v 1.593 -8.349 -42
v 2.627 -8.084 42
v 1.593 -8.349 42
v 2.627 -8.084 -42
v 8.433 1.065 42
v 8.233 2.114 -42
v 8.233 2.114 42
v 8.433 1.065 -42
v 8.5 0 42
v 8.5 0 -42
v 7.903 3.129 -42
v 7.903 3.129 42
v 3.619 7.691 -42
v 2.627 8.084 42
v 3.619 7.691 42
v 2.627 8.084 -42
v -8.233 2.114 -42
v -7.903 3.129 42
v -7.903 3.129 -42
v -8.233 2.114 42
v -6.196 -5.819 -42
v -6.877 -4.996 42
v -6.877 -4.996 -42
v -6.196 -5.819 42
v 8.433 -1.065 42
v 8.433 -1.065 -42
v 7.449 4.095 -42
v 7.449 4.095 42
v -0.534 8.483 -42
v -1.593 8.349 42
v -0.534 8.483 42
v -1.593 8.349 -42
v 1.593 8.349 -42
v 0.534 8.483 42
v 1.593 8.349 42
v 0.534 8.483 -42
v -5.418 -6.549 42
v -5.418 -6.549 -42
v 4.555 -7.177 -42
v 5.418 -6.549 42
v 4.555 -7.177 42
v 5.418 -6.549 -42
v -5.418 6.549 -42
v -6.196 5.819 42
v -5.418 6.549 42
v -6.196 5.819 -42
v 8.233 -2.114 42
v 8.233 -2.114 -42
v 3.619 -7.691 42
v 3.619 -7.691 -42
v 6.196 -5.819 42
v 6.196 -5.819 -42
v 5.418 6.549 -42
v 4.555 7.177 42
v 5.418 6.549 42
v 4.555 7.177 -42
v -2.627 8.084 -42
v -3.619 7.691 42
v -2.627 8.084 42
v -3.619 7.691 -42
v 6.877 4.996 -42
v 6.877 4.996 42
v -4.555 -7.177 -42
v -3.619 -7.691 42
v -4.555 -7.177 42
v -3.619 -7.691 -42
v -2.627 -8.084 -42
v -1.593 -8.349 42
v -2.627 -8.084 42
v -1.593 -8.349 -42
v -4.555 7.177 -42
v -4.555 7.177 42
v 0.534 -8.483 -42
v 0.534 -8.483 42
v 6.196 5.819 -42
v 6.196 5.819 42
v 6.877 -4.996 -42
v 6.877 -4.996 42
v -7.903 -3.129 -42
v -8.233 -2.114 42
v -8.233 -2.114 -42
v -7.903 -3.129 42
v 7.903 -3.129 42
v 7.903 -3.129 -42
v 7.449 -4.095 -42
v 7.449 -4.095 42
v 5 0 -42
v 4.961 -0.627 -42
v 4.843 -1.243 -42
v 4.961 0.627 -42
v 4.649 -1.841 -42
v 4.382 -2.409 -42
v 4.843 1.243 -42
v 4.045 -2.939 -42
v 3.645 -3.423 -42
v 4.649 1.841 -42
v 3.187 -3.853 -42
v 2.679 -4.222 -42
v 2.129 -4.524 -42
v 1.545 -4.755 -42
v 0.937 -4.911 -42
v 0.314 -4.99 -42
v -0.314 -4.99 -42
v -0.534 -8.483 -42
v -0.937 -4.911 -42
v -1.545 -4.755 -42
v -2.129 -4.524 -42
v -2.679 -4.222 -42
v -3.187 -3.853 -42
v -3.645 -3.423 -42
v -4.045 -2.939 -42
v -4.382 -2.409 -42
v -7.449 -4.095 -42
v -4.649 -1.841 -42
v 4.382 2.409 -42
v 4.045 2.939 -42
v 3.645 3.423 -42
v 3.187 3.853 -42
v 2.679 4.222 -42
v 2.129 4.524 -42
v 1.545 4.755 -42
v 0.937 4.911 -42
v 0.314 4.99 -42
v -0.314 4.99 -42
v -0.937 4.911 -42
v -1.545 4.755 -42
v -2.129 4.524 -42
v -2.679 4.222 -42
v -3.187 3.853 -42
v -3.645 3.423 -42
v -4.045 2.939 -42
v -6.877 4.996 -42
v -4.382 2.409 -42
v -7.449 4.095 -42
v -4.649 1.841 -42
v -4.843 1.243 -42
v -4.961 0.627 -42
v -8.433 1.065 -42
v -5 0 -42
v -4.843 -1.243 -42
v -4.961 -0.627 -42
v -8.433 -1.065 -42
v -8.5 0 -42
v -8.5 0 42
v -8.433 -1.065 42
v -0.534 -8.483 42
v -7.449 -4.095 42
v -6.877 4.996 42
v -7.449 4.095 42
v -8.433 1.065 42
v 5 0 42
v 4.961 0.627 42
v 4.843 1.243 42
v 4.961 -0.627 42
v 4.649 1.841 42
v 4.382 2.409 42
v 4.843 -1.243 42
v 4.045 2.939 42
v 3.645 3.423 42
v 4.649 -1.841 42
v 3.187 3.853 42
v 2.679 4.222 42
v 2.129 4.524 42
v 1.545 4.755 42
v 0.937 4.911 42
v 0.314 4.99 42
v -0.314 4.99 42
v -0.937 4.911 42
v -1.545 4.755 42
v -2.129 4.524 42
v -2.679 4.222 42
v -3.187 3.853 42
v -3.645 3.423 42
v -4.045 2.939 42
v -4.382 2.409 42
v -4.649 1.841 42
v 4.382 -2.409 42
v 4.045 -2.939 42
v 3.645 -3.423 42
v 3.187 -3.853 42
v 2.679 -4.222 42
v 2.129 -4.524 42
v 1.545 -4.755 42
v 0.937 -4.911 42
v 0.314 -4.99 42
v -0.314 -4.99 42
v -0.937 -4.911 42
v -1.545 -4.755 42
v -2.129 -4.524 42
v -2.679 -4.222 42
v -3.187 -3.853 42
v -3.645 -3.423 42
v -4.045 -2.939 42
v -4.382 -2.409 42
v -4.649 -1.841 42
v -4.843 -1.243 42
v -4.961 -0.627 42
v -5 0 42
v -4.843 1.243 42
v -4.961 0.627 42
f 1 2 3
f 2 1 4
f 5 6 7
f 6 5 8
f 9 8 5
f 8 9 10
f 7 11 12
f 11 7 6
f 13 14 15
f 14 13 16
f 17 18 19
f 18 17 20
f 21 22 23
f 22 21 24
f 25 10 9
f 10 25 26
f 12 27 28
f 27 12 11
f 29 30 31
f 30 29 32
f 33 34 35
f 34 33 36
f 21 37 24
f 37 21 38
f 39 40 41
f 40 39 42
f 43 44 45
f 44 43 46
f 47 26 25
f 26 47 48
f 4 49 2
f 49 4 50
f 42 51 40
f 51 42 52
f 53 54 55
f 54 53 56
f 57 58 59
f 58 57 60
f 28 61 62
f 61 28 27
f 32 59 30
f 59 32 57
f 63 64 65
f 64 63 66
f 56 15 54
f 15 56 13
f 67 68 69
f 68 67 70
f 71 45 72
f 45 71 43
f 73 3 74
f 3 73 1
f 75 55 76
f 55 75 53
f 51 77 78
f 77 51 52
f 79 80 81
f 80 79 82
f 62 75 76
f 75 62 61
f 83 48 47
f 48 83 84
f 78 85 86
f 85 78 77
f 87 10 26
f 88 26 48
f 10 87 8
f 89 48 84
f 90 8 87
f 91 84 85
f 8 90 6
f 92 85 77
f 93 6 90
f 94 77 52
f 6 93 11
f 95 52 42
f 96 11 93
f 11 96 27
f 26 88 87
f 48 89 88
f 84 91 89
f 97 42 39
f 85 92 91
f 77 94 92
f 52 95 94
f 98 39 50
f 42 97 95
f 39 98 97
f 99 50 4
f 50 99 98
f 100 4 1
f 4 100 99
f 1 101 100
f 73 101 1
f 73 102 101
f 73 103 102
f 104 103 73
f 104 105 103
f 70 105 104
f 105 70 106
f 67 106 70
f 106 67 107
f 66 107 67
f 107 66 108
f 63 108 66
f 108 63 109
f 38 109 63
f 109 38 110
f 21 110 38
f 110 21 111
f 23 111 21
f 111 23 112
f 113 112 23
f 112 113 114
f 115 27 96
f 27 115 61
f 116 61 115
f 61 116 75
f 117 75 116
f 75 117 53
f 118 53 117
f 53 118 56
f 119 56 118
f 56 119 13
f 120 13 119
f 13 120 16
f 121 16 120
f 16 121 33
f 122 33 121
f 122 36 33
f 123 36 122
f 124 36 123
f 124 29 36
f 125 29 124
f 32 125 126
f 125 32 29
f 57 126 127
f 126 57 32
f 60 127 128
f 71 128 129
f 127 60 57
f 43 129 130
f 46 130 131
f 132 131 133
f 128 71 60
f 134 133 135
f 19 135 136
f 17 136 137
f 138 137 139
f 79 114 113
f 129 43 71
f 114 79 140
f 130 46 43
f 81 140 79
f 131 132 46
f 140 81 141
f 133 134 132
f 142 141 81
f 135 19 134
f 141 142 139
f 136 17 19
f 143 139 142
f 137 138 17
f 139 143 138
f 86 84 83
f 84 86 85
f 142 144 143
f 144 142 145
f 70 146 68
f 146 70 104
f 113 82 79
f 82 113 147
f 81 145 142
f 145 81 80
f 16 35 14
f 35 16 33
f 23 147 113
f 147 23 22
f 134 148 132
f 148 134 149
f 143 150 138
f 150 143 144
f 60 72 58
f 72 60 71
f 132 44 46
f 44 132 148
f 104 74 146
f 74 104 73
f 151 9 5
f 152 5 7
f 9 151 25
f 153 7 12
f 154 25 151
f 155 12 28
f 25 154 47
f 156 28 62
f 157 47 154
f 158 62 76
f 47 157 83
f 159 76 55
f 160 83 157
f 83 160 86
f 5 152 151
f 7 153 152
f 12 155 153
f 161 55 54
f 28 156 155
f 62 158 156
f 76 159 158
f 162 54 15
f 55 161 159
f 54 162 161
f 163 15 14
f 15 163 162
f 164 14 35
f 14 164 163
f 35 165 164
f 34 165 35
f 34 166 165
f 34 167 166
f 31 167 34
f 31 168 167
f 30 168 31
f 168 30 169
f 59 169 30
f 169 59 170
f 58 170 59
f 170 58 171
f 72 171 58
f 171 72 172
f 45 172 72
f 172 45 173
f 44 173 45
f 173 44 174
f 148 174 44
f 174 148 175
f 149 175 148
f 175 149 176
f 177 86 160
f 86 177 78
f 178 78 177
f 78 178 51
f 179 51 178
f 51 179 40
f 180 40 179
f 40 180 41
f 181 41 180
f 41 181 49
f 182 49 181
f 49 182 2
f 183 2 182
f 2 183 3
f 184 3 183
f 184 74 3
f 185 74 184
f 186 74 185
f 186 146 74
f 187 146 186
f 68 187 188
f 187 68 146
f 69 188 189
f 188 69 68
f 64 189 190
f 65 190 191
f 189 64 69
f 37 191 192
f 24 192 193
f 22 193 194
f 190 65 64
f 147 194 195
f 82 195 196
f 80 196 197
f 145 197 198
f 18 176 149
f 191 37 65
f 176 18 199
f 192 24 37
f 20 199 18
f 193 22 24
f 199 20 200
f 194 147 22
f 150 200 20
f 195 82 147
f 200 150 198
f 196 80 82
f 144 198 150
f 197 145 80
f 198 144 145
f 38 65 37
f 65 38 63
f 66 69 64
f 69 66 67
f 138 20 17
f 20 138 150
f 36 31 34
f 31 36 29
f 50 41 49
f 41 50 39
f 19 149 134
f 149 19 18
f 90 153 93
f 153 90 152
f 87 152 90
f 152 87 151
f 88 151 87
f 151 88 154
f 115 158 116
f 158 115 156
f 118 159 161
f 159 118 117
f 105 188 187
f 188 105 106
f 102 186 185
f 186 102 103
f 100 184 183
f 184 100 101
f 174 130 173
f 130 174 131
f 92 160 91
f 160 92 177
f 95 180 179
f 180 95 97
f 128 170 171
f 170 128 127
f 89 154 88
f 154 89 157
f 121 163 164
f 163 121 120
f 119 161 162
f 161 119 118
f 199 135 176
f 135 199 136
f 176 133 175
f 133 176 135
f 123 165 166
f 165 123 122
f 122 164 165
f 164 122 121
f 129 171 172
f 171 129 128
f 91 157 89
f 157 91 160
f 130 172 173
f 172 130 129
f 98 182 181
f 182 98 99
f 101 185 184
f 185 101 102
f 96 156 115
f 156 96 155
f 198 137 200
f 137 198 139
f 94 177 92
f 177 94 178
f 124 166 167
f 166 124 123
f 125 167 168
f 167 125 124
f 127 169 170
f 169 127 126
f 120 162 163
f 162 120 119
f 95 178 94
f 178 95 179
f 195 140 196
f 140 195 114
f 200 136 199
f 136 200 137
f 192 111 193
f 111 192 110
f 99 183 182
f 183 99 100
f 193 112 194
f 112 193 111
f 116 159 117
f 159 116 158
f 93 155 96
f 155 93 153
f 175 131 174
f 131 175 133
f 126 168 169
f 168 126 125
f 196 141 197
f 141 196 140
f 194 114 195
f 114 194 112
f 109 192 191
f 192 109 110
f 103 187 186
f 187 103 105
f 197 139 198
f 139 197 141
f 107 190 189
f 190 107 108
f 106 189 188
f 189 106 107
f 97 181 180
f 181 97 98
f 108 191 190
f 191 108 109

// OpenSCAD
$fn = 50;


difference() {
	union() {
		translate(v = [0, 0, -42.0000000000]) {
			cylinder(h = 84, r = 8.5000000000);
		}
	}
	union() {
		translate(v = [0, 0, -100.0000000000]) {
			cylinder(h = 200, r = 5.0000000000);
		}
	}
}
